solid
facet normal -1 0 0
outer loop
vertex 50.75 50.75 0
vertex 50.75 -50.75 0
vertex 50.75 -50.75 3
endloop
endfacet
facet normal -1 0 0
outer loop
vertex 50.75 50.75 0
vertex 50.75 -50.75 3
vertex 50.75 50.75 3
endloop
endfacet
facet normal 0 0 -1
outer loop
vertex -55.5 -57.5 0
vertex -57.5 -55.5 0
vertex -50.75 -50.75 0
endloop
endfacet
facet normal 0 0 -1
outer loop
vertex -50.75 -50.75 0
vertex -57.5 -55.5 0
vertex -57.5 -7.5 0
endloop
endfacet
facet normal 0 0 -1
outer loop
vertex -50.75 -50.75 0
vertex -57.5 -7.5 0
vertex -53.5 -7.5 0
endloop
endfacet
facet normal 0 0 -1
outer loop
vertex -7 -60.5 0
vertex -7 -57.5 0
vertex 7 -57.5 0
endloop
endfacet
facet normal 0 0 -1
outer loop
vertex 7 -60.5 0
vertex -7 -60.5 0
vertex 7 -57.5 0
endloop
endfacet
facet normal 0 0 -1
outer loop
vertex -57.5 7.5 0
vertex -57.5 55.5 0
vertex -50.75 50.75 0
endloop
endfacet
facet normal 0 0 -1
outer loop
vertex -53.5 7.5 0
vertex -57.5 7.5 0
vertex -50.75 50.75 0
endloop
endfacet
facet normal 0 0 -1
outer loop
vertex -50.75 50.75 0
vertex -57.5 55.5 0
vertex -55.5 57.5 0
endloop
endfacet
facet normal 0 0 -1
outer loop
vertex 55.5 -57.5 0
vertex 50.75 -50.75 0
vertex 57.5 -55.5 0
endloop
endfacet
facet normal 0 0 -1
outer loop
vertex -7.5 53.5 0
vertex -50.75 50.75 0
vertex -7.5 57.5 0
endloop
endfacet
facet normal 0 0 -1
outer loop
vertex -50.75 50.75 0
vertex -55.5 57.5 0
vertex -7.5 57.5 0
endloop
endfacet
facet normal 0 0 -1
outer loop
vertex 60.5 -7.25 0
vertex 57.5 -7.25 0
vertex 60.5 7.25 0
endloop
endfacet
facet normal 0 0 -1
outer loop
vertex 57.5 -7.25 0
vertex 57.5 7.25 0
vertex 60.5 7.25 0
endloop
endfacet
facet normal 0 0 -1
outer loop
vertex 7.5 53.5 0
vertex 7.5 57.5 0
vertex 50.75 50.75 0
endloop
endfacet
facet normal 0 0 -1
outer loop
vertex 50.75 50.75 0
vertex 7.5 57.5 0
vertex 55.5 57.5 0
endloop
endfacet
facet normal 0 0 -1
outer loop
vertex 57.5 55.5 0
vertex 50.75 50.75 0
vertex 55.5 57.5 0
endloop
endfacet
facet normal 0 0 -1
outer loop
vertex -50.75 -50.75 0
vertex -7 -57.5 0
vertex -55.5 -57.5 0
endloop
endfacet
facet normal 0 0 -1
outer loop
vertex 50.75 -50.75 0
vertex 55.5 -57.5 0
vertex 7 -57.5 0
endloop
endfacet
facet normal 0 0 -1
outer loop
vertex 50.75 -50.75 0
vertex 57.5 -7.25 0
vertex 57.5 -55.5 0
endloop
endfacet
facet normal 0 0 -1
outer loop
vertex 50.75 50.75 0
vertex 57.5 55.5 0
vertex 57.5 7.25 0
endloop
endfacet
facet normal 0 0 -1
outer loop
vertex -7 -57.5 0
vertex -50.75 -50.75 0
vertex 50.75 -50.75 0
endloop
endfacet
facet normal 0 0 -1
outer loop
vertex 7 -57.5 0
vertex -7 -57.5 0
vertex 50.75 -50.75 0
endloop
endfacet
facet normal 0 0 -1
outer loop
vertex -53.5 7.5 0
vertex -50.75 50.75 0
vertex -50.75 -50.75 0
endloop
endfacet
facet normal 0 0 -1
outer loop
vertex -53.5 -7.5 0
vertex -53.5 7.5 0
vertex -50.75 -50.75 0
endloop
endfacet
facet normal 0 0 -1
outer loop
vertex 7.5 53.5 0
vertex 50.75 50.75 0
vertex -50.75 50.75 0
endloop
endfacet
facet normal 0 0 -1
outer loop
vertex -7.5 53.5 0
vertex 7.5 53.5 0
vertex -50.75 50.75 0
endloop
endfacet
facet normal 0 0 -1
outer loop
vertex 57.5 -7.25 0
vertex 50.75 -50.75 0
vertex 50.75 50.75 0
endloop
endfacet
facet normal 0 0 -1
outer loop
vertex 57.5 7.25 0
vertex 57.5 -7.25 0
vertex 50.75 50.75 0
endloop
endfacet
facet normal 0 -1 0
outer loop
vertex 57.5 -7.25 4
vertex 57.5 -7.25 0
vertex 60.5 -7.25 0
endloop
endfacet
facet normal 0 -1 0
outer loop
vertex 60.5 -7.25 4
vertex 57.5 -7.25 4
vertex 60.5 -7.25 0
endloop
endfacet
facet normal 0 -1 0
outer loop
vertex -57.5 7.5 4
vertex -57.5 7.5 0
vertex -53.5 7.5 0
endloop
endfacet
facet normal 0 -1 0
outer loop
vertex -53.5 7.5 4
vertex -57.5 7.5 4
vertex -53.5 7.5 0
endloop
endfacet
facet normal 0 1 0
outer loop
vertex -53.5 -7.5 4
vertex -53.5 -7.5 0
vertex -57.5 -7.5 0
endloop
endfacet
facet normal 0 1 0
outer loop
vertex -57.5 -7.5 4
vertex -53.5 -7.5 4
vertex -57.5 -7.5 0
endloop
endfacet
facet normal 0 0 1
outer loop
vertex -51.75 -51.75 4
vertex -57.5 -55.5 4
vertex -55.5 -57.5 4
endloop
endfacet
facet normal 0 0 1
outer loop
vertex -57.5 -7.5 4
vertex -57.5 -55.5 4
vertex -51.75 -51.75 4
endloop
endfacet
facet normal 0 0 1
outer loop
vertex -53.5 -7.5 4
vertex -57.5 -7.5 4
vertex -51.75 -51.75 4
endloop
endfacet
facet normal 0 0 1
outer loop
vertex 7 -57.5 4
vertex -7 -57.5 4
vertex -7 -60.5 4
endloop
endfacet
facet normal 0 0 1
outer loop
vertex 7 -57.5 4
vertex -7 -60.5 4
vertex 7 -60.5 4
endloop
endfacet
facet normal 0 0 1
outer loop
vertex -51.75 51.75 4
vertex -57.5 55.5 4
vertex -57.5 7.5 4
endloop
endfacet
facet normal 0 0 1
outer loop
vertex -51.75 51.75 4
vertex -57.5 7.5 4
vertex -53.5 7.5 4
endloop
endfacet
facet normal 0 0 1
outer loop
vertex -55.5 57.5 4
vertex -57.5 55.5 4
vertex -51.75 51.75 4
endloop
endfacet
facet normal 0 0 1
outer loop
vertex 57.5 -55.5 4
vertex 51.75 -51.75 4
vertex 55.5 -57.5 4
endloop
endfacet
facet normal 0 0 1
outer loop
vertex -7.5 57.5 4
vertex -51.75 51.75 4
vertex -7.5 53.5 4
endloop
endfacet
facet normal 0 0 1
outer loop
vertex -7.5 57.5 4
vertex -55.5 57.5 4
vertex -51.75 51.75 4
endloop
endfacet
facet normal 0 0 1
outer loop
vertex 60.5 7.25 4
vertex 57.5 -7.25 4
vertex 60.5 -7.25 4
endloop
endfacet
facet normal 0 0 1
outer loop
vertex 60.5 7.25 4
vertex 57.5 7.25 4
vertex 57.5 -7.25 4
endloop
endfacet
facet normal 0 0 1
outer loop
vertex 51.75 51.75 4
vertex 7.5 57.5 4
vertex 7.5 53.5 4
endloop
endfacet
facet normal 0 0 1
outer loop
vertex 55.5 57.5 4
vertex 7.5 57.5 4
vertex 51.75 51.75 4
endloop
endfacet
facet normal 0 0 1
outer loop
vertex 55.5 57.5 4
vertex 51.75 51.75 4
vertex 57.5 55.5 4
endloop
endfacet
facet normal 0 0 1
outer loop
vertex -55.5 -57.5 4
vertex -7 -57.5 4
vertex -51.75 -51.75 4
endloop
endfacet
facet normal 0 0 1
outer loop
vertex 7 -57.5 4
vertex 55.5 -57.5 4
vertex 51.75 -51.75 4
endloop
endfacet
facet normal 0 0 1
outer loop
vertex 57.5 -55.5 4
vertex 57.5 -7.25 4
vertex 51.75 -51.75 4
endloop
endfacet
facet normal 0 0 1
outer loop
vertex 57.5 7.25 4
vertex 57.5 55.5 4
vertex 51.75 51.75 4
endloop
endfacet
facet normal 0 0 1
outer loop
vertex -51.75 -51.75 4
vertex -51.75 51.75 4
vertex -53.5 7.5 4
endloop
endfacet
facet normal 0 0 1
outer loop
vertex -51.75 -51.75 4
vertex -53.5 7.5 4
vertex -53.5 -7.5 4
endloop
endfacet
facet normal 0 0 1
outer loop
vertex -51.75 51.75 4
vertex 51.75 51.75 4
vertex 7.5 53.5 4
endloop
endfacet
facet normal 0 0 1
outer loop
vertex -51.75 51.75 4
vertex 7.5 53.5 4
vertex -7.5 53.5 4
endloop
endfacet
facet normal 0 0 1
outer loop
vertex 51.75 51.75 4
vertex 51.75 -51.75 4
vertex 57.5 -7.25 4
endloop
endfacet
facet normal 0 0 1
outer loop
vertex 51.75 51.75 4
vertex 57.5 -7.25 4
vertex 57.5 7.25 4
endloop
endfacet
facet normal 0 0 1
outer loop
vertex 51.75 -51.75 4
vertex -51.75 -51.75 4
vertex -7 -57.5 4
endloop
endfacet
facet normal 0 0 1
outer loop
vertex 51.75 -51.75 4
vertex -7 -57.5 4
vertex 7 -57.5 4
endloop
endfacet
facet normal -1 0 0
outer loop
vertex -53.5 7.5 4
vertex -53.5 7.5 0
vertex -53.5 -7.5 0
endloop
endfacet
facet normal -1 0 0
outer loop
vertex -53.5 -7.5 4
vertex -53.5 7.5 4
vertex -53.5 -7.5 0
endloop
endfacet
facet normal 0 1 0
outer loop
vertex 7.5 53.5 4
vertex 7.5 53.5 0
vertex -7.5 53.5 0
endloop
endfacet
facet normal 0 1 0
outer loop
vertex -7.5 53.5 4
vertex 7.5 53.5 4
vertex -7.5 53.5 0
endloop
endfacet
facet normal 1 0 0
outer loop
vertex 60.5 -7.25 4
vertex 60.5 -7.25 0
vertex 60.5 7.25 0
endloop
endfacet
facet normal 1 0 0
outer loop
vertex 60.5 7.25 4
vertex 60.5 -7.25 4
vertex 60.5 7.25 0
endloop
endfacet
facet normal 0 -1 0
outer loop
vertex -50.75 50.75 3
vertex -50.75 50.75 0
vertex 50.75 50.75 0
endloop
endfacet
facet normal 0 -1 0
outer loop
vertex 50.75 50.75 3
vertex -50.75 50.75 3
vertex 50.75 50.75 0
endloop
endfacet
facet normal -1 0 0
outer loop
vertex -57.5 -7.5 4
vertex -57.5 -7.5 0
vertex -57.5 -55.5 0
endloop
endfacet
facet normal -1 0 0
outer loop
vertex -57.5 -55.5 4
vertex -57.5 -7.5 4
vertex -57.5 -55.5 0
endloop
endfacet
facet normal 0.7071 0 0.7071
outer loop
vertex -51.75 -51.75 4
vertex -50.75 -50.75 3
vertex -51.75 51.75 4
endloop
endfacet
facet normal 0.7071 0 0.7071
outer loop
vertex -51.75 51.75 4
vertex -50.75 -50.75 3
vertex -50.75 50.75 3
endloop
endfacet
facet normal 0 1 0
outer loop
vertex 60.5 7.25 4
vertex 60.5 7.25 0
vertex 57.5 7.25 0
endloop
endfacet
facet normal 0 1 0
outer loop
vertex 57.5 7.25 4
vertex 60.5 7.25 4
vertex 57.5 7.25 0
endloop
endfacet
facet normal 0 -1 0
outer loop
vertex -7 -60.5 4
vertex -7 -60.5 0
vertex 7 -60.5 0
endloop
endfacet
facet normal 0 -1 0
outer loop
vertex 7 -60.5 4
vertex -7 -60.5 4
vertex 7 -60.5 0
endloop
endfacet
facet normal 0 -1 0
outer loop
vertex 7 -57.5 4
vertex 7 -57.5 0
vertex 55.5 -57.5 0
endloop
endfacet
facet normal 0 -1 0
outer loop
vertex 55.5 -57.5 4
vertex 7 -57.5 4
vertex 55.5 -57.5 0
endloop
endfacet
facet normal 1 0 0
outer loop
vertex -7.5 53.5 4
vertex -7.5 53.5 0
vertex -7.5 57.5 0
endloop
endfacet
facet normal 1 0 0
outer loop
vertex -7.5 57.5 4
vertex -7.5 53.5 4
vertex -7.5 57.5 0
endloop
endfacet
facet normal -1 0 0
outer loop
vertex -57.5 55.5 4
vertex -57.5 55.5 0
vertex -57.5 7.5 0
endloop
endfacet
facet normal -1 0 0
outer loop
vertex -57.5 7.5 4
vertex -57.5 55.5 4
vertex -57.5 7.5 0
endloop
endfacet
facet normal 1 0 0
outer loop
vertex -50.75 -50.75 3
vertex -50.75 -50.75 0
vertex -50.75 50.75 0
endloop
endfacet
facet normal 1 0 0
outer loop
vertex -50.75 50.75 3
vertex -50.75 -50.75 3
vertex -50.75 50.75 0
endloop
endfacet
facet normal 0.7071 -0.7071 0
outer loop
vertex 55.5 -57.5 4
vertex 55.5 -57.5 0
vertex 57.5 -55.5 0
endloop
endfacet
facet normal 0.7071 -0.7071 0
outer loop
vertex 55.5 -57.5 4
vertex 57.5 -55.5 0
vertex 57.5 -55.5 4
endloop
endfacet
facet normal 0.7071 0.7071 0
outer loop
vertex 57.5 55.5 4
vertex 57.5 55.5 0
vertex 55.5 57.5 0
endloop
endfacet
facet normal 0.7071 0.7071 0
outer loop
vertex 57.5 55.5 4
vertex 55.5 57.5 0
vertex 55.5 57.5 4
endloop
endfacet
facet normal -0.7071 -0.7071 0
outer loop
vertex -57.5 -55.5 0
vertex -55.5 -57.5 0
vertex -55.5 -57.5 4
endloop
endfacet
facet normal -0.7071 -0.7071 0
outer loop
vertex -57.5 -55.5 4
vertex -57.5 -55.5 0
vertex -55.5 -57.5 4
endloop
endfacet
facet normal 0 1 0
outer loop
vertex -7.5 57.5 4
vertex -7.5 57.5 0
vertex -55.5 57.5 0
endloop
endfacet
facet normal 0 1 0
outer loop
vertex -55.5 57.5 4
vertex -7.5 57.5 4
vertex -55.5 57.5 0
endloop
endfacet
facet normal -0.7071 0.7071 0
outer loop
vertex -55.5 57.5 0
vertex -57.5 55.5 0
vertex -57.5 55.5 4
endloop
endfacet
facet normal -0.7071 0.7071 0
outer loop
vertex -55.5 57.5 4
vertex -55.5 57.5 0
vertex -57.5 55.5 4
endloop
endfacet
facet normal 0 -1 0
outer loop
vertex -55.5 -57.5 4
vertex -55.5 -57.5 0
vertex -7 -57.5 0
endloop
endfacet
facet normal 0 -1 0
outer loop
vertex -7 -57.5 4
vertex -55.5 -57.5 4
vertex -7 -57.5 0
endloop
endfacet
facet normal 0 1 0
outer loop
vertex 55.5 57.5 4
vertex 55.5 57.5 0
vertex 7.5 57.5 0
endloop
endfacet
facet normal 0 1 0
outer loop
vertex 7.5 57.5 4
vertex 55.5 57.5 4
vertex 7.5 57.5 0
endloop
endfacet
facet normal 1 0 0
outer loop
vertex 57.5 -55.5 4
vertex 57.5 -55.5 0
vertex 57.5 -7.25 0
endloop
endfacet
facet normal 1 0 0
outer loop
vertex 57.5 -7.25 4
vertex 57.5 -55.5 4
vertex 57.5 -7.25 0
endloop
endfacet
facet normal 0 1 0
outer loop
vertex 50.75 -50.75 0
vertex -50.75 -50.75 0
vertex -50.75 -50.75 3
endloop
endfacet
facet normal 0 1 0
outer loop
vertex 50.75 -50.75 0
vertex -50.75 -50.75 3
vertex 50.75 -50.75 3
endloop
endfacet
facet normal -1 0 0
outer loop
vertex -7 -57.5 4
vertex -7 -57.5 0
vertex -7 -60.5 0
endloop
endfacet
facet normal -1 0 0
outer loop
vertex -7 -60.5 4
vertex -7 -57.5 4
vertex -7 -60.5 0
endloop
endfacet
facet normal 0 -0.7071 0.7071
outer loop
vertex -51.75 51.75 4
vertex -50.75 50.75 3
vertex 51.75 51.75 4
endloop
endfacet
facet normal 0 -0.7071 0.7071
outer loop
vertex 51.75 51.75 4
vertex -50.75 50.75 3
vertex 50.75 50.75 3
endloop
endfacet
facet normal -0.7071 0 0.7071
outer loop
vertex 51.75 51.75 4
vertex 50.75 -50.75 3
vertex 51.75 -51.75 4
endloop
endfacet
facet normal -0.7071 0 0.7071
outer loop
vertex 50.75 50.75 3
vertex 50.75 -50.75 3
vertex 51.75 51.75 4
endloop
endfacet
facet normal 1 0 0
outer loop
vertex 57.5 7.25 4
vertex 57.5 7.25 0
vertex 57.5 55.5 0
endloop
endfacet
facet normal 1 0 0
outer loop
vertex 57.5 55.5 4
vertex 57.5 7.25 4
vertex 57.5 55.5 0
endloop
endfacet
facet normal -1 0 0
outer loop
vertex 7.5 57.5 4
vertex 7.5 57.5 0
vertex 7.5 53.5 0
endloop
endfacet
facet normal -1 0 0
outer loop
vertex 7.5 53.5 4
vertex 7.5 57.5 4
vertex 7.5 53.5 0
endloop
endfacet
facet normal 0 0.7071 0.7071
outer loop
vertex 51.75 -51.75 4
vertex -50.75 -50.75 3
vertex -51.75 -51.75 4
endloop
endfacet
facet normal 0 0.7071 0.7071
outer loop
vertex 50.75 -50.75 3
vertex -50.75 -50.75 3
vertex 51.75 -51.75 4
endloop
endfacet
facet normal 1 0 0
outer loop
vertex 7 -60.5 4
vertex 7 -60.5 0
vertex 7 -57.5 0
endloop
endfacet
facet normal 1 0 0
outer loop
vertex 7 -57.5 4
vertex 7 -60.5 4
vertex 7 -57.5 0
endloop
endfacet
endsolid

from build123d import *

# Parameters (mm, degrees)
F0_W     = 101.5
F0_H     = 101.5
F1_DEPTH = 4
F2_SIZE  = 2
F3_SIZE  = 1


with BuildPart() as f1:
    # F0 (on Top) → F1 (new body)
    with BuildSketch(Plane.XY):
        Polygon((-7.5, 57.5), (-57.5, 57.5), (-57.5, 7.5), (-53.5, 7.5), (-53.5, -7.5), (-57.5, -7.5), (-57.5, -57.5), (-7, -57.5), (-7, -60.5), (7, -60.5), (7, -57.5), (57.5, -57.5), (57.5, -7.25), (60.5, -7.25), (60.5, 7.25), (57.5, 7.25), (57.5, 57.5), (7.5, 57.5), (7.5, 53.5), (-7.5, 53.5), align=None)
        Rectangle(F0_W, F0_H, mode=Mode.SUBTRACT)
    extrude(amount=F1_DEPTH)

    # F2
    f2_edges = [f1.edges().sort_by_distance(p)[0] for p in [
        (-57.5, -57.5, 2),
        (57.5, -57.5, 2),
        (57.5, 57.5, 2),
        (-57.5, 57.5, 2),
    ]]
    chamfer(f2_edges, length=F2_SIZE)

    # F3
    f3_edges = [f1.edges().sort_by_distance(p)[0] for p in [
        (-50.75, 0, 4),
        (0, 50.75, 4),
        (50.75, 0, 4),
        (0, -50.75, 4),
    ]]
    chamfer(f3_edges, length=F3_SIZE)


solid = f1.part
